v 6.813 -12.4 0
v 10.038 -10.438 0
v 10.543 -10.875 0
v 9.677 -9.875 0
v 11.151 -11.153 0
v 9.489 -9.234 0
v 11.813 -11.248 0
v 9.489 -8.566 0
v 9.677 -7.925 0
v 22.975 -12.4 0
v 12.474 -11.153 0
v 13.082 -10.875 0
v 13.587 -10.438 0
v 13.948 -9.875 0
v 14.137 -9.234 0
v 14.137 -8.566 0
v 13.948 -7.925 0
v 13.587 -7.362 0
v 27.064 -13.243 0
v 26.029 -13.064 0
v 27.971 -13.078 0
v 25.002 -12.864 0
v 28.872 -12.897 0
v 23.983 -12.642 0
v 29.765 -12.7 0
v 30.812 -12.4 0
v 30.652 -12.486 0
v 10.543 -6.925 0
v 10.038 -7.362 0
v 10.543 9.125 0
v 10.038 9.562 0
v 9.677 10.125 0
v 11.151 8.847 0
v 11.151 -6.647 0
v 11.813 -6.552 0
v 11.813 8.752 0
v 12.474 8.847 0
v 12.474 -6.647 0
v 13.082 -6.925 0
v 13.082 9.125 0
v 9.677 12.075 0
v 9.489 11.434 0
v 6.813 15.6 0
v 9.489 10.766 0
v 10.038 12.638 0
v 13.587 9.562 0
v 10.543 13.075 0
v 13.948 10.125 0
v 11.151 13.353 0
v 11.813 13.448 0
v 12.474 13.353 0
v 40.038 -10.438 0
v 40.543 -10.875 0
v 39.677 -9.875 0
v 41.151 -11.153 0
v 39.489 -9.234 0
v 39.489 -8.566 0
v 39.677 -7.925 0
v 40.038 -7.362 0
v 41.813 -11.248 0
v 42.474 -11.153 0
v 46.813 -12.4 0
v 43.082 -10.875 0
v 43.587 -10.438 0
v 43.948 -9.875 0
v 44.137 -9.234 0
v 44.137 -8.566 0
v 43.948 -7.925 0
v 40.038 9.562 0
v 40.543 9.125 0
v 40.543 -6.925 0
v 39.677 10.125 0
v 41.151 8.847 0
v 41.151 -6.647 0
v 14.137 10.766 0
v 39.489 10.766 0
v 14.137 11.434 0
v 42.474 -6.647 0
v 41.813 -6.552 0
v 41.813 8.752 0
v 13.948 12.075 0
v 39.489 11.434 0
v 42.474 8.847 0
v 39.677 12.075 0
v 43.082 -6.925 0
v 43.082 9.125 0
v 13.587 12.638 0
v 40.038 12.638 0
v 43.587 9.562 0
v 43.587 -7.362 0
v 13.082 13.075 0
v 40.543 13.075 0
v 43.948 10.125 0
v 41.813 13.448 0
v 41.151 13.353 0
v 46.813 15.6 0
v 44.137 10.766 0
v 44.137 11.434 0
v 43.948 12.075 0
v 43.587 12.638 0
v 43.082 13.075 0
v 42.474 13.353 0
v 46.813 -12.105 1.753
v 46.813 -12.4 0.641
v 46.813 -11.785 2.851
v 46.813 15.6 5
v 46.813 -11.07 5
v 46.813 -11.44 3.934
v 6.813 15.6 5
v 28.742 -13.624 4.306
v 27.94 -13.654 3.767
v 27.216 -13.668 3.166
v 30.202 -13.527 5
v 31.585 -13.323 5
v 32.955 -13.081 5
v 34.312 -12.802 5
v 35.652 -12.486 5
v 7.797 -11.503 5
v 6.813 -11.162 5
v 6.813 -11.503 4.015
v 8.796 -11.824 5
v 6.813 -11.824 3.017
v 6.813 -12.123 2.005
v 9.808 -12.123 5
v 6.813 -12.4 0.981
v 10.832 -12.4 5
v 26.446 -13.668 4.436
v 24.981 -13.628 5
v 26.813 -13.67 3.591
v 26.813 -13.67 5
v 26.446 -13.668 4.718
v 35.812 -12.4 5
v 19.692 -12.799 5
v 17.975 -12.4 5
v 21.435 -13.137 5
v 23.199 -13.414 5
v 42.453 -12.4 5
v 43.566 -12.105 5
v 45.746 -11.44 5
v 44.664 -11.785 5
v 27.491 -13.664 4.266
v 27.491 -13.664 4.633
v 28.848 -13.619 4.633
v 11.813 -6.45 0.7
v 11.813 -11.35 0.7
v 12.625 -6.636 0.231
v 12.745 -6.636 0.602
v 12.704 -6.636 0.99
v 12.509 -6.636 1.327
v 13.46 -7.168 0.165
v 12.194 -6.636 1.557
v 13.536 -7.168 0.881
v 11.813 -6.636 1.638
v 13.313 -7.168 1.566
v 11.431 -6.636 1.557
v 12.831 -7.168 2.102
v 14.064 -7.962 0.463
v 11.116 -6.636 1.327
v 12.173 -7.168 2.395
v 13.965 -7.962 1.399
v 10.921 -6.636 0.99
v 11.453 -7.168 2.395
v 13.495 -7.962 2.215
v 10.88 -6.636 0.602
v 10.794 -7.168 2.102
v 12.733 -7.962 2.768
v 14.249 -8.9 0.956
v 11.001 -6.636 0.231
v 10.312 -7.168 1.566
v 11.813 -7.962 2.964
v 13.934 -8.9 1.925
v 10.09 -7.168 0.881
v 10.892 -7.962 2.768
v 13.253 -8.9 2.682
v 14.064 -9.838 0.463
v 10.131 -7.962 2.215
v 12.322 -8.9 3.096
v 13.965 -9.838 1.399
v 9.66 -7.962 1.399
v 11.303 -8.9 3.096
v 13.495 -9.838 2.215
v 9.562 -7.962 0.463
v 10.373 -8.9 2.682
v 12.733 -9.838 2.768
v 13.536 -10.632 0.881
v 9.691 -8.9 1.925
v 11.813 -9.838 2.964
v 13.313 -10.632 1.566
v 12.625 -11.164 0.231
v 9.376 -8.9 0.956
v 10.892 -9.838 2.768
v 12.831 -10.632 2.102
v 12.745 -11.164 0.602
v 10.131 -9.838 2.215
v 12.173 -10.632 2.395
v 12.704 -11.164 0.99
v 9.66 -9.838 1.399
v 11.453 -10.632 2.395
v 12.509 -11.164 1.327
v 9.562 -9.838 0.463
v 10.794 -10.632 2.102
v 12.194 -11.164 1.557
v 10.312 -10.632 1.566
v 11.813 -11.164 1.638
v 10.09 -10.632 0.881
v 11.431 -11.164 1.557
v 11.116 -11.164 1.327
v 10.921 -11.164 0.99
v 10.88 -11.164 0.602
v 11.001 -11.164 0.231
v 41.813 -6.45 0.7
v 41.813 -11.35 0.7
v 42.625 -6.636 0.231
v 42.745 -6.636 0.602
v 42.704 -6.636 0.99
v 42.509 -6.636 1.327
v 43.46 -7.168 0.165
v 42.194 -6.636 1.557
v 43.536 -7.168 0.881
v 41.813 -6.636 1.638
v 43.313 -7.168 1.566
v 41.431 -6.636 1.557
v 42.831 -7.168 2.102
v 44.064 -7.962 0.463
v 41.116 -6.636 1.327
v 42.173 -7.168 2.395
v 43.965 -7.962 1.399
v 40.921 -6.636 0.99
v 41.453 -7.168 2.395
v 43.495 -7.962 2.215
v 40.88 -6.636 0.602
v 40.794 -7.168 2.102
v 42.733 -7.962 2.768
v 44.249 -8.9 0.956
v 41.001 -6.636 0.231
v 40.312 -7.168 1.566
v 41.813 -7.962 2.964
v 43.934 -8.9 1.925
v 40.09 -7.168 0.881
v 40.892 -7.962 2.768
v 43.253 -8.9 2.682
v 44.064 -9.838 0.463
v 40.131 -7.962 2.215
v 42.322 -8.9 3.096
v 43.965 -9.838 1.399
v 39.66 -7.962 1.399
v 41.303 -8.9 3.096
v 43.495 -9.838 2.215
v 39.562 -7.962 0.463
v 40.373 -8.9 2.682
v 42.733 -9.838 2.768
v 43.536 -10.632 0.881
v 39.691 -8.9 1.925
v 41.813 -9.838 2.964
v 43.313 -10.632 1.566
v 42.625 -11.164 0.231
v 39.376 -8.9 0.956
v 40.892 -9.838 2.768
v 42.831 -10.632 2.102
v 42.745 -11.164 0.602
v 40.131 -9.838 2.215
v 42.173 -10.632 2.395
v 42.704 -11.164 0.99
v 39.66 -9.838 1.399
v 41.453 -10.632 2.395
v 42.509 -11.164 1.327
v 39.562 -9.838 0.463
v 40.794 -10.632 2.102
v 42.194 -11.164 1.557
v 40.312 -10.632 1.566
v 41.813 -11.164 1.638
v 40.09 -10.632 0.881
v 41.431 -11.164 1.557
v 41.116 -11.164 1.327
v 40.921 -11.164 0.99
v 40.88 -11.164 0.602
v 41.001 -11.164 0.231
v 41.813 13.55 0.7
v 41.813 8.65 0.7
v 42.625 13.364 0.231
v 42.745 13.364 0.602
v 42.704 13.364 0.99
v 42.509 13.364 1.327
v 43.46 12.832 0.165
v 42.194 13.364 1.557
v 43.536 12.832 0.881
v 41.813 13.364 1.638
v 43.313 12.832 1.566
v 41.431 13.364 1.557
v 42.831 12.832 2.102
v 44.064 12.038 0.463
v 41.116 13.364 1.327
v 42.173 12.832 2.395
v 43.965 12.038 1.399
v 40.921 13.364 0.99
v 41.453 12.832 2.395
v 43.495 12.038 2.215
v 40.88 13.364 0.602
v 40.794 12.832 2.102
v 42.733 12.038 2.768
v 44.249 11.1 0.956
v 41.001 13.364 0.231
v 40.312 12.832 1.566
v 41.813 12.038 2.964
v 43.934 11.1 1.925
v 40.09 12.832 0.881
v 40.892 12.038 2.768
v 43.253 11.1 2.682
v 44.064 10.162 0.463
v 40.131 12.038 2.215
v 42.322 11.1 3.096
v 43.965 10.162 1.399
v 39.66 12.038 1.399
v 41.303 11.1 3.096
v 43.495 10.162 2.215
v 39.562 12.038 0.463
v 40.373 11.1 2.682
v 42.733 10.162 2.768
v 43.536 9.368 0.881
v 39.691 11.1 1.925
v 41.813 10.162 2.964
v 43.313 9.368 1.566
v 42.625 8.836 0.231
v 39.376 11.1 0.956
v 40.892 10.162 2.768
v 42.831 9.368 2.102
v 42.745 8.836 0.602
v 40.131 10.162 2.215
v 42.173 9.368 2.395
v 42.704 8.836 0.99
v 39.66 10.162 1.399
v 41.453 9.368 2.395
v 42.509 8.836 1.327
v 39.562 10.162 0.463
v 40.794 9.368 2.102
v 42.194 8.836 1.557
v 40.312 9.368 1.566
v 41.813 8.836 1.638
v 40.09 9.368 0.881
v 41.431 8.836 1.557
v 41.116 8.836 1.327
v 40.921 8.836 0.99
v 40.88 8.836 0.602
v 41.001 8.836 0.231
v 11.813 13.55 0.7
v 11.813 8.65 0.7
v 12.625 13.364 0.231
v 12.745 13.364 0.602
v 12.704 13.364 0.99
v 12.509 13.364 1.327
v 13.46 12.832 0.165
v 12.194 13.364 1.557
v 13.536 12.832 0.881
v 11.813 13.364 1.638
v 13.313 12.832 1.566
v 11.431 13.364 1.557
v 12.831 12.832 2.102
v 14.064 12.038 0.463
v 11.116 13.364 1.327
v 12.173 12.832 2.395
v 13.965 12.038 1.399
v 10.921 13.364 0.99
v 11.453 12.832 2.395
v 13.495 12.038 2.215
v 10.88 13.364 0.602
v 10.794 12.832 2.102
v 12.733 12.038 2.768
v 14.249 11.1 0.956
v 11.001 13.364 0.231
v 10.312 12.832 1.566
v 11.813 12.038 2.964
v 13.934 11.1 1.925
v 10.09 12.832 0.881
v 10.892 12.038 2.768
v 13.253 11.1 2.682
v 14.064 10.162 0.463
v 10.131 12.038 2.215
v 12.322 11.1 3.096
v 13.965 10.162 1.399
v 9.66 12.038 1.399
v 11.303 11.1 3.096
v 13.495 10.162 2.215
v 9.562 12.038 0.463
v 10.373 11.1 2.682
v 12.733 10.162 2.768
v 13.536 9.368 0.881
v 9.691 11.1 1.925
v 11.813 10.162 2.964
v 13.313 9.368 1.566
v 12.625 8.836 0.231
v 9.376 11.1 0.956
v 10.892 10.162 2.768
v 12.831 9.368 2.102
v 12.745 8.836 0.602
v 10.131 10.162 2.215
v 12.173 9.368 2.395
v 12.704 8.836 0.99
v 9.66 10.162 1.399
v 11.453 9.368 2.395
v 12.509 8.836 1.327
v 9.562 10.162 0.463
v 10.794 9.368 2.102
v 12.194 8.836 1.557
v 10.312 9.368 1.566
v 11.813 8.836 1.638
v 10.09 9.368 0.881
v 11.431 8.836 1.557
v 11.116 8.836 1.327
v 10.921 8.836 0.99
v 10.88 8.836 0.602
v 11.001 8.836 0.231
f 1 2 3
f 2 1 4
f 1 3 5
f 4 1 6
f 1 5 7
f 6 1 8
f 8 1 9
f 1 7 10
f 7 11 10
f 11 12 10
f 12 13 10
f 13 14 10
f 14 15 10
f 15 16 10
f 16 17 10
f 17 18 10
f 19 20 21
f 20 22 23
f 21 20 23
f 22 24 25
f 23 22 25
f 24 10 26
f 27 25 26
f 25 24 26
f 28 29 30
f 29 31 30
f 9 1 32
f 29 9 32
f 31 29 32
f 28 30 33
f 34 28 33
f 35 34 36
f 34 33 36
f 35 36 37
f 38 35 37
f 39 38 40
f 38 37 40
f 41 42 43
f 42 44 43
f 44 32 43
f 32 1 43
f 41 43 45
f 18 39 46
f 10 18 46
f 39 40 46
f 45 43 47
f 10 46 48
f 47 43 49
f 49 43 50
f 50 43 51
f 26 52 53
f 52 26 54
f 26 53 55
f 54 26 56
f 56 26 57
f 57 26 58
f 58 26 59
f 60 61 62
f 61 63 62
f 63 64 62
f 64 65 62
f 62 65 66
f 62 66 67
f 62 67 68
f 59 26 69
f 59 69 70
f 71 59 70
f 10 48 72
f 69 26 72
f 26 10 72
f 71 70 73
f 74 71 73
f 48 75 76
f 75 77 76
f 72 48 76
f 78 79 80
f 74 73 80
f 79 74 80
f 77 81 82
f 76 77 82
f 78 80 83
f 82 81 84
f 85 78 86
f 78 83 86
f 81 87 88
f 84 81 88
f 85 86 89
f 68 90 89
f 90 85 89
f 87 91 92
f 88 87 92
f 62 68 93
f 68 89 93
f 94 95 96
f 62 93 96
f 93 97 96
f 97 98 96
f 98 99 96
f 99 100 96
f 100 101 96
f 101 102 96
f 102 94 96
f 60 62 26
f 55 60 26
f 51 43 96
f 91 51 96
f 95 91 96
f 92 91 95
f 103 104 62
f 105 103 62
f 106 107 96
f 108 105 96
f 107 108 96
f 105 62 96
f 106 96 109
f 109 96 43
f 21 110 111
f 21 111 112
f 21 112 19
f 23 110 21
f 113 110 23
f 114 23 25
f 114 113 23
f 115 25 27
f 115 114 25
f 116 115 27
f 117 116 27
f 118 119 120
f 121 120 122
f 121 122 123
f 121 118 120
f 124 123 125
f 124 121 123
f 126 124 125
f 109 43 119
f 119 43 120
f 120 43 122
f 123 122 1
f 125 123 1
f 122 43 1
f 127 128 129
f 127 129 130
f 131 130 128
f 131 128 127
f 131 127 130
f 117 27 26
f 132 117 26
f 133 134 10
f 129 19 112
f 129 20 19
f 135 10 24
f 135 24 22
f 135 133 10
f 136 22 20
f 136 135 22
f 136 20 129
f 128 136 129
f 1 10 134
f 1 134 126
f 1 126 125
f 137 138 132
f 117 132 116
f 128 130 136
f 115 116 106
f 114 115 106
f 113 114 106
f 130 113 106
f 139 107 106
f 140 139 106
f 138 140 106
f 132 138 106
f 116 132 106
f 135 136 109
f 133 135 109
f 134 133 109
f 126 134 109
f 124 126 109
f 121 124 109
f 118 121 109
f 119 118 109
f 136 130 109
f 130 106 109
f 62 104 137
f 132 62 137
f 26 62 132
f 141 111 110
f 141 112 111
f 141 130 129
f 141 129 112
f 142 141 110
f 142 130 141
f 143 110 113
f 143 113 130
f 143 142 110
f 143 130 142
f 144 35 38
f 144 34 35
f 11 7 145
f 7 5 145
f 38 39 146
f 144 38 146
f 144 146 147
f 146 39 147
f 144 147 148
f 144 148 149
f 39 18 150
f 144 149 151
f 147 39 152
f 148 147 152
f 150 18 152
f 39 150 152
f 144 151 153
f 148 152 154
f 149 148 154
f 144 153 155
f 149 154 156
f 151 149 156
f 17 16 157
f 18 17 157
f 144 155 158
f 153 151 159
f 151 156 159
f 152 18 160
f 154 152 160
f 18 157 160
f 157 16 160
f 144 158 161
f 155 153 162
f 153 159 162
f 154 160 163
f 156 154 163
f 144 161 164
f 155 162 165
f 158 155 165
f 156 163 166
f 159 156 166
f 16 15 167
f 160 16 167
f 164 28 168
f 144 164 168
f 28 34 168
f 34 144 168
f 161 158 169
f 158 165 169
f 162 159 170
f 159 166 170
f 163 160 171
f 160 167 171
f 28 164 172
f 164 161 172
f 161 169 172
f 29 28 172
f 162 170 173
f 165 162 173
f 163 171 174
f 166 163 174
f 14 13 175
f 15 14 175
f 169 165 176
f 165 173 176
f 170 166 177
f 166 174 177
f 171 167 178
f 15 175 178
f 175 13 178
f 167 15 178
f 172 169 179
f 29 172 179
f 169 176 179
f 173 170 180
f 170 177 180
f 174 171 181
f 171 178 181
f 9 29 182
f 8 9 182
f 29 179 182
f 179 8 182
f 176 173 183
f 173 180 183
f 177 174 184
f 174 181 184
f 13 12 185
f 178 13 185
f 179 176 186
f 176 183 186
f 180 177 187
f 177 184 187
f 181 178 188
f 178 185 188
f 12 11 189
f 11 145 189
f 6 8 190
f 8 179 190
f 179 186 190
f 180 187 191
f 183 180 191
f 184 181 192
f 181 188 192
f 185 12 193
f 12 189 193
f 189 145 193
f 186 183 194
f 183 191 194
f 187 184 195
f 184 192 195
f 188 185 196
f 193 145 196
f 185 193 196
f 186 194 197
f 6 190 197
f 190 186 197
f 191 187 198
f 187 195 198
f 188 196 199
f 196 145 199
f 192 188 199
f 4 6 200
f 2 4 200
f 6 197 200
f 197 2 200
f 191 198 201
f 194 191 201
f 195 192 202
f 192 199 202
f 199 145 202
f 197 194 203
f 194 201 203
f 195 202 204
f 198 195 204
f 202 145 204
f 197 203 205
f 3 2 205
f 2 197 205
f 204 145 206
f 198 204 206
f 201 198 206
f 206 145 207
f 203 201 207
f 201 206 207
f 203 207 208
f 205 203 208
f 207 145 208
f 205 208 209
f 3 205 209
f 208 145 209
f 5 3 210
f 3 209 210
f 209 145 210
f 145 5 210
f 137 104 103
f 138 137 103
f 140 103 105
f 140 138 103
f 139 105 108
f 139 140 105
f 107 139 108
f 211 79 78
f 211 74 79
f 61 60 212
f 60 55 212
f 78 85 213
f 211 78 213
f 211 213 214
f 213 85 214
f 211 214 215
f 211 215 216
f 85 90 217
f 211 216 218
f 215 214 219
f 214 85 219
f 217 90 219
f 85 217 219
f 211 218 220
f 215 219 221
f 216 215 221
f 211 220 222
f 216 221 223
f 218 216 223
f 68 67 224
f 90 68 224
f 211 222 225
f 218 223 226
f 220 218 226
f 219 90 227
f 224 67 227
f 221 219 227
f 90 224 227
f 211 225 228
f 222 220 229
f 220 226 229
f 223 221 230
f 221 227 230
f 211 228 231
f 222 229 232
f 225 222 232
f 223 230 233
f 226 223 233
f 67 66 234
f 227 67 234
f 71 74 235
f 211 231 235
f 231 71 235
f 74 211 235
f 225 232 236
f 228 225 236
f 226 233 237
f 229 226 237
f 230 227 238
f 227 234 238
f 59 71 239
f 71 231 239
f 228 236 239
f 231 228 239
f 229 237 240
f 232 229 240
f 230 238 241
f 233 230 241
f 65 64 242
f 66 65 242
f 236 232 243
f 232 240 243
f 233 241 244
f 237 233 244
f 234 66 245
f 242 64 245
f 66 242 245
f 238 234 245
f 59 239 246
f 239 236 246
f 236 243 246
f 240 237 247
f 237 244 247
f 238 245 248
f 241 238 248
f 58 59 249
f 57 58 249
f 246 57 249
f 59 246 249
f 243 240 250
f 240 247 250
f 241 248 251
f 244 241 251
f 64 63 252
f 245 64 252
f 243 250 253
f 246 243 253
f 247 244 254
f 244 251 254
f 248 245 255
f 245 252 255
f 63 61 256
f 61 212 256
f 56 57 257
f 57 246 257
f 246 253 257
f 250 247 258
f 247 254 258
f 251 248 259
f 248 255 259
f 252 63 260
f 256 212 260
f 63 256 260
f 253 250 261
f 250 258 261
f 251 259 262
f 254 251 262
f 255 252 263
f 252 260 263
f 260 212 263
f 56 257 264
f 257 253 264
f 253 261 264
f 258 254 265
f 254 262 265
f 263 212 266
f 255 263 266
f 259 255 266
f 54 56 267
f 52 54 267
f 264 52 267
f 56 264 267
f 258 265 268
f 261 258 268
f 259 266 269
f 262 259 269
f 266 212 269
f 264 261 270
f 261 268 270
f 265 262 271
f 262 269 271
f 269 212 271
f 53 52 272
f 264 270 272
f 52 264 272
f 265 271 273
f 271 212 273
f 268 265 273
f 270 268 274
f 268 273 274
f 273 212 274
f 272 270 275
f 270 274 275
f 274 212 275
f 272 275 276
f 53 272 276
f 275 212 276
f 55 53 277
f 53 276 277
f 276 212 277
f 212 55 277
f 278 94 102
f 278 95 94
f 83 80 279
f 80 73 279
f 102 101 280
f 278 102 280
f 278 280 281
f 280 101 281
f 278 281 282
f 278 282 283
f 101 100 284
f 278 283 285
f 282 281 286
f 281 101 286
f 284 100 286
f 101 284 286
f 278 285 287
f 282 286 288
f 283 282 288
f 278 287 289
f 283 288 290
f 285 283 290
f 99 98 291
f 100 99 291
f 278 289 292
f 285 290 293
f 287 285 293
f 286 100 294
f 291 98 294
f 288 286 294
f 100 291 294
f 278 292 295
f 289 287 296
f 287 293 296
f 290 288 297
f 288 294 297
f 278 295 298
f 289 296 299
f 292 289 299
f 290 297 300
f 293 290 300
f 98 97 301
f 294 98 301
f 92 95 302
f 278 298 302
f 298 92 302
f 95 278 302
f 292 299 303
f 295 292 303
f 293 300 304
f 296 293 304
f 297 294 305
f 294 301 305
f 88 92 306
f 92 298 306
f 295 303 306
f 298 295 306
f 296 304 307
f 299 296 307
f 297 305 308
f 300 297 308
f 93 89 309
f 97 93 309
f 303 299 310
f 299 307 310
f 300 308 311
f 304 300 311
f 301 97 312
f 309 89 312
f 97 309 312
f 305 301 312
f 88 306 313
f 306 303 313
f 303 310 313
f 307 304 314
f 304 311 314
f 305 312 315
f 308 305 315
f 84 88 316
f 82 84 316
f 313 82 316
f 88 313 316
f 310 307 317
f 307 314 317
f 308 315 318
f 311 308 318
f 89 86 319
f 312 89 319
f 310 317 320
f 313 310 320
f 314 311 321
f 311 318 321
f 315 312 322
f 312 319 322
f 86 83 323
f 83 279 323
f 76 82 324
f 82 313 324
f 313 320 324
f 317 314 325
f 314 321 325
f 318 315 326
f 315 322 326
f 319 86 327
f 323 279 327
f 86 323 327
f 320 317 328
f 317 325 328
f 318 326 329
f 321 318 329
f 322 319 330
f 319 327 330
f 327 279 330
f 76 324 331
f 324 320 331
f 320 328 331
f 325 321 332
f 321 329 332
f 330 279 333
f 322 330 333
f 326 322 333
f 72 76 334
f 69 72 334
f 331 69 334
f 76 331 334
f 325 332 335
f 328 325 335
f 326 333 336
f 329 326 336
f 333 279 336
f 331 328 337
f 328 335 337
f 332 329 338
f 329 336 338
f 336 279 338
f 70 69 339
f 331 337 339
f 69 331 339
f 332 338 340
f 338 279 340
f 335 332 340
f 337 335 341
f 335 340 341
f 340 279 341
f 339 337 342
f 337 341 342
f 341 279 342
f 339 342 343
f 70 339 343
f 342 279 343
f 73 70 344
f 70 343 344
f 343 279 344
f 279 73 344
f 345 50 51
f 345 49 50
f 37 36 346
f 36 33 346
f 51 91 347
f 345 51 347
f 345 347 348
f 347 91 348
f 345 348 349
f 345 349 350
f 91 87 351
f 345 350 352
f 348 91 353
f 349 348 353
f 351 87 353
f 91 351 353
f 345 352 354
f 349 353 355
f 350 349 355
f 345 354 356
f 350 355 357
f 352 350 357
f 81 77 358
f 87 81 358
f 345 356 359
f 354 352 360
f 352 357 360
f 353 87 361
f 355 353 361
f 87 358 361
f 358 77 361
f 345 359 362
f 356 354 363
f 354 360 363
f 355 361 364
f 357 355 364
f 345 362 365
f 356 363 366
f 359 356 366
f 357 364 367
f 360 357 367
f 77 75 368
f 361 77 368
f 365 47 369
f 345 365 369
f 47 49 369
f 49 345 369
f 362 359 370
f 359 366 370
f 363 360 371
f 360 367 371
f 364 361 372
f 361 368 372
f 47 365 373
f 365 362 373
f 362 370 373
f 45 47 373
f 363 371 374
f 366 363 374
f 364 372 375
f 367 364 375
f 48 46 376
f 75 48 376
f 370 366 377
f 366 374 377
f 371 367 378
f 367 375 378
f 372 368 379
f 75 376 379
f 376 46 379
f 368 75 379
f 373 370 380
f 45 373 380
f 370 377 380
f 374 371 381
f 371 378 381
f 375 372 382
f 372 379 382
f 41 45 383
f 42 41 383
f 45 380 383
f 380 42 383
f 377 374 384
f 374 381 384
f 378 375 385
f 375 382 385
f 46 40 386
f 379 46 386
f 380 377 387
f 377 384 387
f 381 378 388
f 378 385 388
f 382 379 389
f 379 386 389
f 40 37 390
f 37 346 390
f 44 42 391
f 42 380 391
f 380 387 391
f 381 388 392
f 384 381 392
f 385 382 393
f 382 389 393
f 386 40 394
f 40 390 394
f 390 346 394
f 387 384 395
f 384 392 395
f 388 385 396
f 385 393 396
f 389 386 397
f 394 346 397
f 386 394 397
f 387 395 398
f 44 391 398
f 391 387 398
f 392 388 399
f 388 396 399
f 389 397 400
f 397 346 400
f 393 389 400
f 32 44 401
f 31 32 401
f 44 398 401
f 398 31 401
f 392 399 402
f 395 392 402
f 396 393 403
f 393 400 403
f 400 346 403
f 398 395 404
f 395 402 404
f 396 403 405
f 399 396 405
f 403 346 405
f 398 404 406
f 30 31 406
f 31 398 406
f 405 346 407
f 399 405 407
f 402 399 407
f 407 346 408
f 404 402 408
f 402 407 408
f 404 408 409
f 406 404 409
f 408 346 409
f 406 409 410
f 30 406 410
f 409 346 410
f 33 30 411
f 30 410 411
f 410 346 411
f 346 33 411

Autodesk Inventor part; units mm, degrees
ref_plane "Work Plane1" through (0, -12.9, 0) normal (0, 0, 1) x (1, 0, 0)
sketch "Sketch1" plane through (0, -12.9, 0) normal (0, 0, 1) x (1, 0, 0)
  circle A0 centre (26.8127, 14) radius 1.4 construction
  line L0 (6.8127, 27.5) -> (46.8127, 27.5)
  line L1 (46.8127, 27.5) -> (46.8127, 0.5)
  line L2 (46.8127, 0.5) -> (6.8127, 0.5)
  line L3 (6.8127, 0.5) -> (6.8127, 27.5)
  line L4 (6.8127, 27.5) -> (46.8127, 0.5) construction
  line L5 (46.8127, 27.5) -> (6.8127, 0.5) construction
  circle A1 centre (26.8127, 14) radius 12.7 construction
  circle A2 centre (26.8127, 14) radius 13
  line L6 (6.8127, 27.5) -> (46.8127, 27.5)
  line L7 (46.8127, 27.5) -> (46.8127, 28.5)
  line L8 (46.8127, 28.5) -> (6.8127, 28.5)
  line L9 (6.8127, 28.5) -> (6.8127, 27.5)
  point P0 (0, 12.9)
  dimension "d0" = 40
  dimension "d1" = 27
  dimension "d2" = 0.3
  dimension "d14" = 1
ref_plane "Work Plane2" through (14.3627, 1.55, 6) normal (0, 0, 1) x (1, 0, 0)
extrude "Extrusion1" add sketch "Sketch1" along normal up to surface (6 mm away)
ref_plane "Work Plane3" through (11.8127, 24, 6) normal (-1, 0, 0) x (0, 0, 1)
sketch "Sketch2" plane through (11.8127, 24, 6) normal (-1, 0, 0) x (0, 0, 1)
  line L0 (-9.3, 0) -> (1.55, 0) projected
  line L1 (-6, -35.9) -> (-6, -9.9) projected
  line L2 (-10.9, -34.4) -> (0.6933, -34.4)
  line L3 (-10.9, -31.4) -> (0.6933, -31.4)
  line L4 (-10.9, -14.4) -> (0.6933, -14.4)
  line L5 (-10.9, -11.4) -> (0.6933, -11.4)
  arc A0 (-5.3, -10.45) -> (-5.3, -15.35) centre (-5.3, -12.9) ccw
  arc A1 (-5.4335, -30.45) -> (-5.4335, -35.35) centre (-5.4335, -32.9) ccw
  line L6 (-5.4335, -35.35) -> (-5.4335, -30.45)
  line L7 (-5.3, -15.35) -> (-5.3, -10.45)
  point P0 (-6, -24)
  dimension "d22" = 4.9
  dimension "d23" = 1.5
  dimension "d24" = 1.5
revolve "Revolution1" cut sketch "Sketch2" angle 360 about axis through (11.8127, 8.65, 0.7) along (0, 1, 0) contours A0 L4 L1 | L1 L4 L7 A0 | L4 A0 L5 L1 | L1 L5 L7 L4 | L5 A0 L1 | L1 A0 L7 L5
pattern_linear "Rectangular Pattern1" count 2 spacing 20 along (0, -1, 0) count 2 spacing 30 along (1, 0, 0) of "Revolution1"
sketch "Sketch3" plane through (6.8127, -12.4, 6) normal (0, 0, 1) x (1, 0, 0)
  ellipse E0 centre (20, 24.3) end of major axis (41.0718, 24.3) minor radius 14.9 (7.3193, 12.4) -> (20, 9.4) ccw construction
  ellipse E1 centre (20, 24.3) end of major axis (41.0718, 24.3) minor radius 14.9 (20, 9.4) -> (32.6807, 12.4) ccw construction
  circle A0 centre (20, 13.5) radius 13 construction
  line L0 (40, 0) -> (0, 0) construction
  line L1 (40, 28) -> (40, 0) construction
  line L2 (0, 28) -> (40, 28) construction
  line L3 (0, 0) -> (0, 28) construction
  circle A1 centre (20, 13.5) radius 13 construction
  line L4 (40, 0) -> (0, 0) projected
  line L5 (10.0003, 0) -> (29.9997, 0)
  spline S0 degree 5 poles (2.3021, 2.9833) (5.5467, 1.2547) (9.0339, -0.0186) (12.6471, -0.8521) (16.3235, -1.2698) (20, -1.2699) knots 0 0 0 0 0 0 1 1 1 1 1 1
  spline S1 degree 5 poles (20, -1.2699) (23.6765, -1.2698) (27.3529, -0.8521) (30.9661, -0.0186) (34.4533, 1.2547) (37.6979, 2.9833) knots 0 0 0 0 0 0 1 1 1 1 1 1
  point P0 (-6.8127, 12.4)
extrude "Extrusion2" add sketch "Sketch3" against normal up to surface (6 mm away)
ref_plane "Work Plane4" through (26.8127, 23.9, 43.6151) normal (-0.7071068, 0, 0.7071068) x (-0.7071068, 0, -0.7071068)
sketch "Sketch4" plane through (26.8127, 23.9, 43.6151) normal (-0.7071068, 0, 0.7071068) x (-0.7071068, 0, -0.7071068)
  arc A0 (33.8666, 23.9) -> (15.9334, 23.9) centre (24.9, 12) ccw projected
  ellipse E0 centre (26.5979, 22.8) end of major axis (26.5979, 35.8) minor radius 9.1924 construction
  line L0 (12.4558, 36.3) -> (19.5271, 36.3) construction
  line L1 (12.4558, 8.3) -> (12.4558, 36.3) construction
  line L2 (40.74, 8.3) -> (12.4558, 8.3) construction
  line L3 (40.74, 36.3) -> (40.74, 8.3) construction
  line L4 (33.6687, 36.3) -> (40.74, 36.3) projected
  arc A1 (33.5545, 36.3) -> (9.1298, 32.4131) centre (24.9, 12) ccw
  line L5 (33.6687, 36.3) -> (40.74, 36.3) projected
  line L6 (33.5545, 36.3) -> (40.74, 36.3)
  line L7 (40.74, 36.3) -> (40.74, 42.5179)
  line L8 (40.74, 42.5179) -> (9.2813, 42.9694)
  line L9 (9.2813, 42.9694) -> (9.1298, 32.4131)
  point P0 (49.8, 23.9)
extrude "Extrusion3" cut sketch "Sketch4" against normal through all
ref_plane "Work Plane5" through (62.0266, 23.9, 8.4012) normal (0.7071068, 0, 0.7071068) x (-0.7071068, 0, 0.7071068)
sketch "Sketch5" plane through (62.0266, 23.9, 8.4012) normal (0.7071068, 0, 0.7071068) x (-0.7071068, 0, 0.7071068)
  arc A0 (33.8666, 23.9) -> (15.9334, 23.9) centre (24.9, 12) ccw projected
  arc A1 (40.4723, 32.6668) -> (9.3277, 32.6668) centre (24.9, 12) ccw
  line L0 (16.1313, 36.3) -> (11.8886, 36.3) projected
  line L1 (16.1313, 36.3) -> (16.2449, 36.3865) construction
  line L2 (16.2449, 36.3865) -> (16.1313, 36.3)
  line L3 (40.4723, 32.6668) -> (40.4723, 41.9024)
  line L4 (40.4723, 41.9024) -> (12.0732, 41.9024)
  line L5 (12.0732, 41.9024) -> (11.8886, 36.3)
  point P0 (37.9189, 23.9)
extrude "Extrusion4" cut sketch "Sketch5" against normal through all
sketch "Sketch6" plane through (6.8127, 15.6, 6) normal (0, 0, 1) x (1, 0, 0)
  circle A0 centre (20, -14.5) radius 13 projected
  point P0 (-6.8127, -15.6)
extrude "Extrusion5" add sketch "Sketch6" against normal up to surface (6 mm away)
sketch "Sketch7" plane through (6.8127, 15.6, 0) normal (0, 1, 0) x (1, 0, 0)
  line L0 (0, -6) -> (40, -6) construction
  line L1 (40, 0) -> (40, -6) construction
  line L2 (40, 0) -> (0, 0) construction
  line L3 (0, 0) -> (0, -6) construction
  line L4 (0, -6) -> (40, -6)
  line L5 (40, -6) -> (40, -5)
  line L6 (40, -5) -> (0, -5)
  line L7 (0, -5) -> (0, -6)
  point P0 (-6.8127, 0)
  dimension "d27" = 1
extrude "Extrusion6" cut sketch "Sketch7" against normal through all
properties part number "20_Cube_Insert_Kinematic_Mirrormount_45_Thorlabsadapter"
